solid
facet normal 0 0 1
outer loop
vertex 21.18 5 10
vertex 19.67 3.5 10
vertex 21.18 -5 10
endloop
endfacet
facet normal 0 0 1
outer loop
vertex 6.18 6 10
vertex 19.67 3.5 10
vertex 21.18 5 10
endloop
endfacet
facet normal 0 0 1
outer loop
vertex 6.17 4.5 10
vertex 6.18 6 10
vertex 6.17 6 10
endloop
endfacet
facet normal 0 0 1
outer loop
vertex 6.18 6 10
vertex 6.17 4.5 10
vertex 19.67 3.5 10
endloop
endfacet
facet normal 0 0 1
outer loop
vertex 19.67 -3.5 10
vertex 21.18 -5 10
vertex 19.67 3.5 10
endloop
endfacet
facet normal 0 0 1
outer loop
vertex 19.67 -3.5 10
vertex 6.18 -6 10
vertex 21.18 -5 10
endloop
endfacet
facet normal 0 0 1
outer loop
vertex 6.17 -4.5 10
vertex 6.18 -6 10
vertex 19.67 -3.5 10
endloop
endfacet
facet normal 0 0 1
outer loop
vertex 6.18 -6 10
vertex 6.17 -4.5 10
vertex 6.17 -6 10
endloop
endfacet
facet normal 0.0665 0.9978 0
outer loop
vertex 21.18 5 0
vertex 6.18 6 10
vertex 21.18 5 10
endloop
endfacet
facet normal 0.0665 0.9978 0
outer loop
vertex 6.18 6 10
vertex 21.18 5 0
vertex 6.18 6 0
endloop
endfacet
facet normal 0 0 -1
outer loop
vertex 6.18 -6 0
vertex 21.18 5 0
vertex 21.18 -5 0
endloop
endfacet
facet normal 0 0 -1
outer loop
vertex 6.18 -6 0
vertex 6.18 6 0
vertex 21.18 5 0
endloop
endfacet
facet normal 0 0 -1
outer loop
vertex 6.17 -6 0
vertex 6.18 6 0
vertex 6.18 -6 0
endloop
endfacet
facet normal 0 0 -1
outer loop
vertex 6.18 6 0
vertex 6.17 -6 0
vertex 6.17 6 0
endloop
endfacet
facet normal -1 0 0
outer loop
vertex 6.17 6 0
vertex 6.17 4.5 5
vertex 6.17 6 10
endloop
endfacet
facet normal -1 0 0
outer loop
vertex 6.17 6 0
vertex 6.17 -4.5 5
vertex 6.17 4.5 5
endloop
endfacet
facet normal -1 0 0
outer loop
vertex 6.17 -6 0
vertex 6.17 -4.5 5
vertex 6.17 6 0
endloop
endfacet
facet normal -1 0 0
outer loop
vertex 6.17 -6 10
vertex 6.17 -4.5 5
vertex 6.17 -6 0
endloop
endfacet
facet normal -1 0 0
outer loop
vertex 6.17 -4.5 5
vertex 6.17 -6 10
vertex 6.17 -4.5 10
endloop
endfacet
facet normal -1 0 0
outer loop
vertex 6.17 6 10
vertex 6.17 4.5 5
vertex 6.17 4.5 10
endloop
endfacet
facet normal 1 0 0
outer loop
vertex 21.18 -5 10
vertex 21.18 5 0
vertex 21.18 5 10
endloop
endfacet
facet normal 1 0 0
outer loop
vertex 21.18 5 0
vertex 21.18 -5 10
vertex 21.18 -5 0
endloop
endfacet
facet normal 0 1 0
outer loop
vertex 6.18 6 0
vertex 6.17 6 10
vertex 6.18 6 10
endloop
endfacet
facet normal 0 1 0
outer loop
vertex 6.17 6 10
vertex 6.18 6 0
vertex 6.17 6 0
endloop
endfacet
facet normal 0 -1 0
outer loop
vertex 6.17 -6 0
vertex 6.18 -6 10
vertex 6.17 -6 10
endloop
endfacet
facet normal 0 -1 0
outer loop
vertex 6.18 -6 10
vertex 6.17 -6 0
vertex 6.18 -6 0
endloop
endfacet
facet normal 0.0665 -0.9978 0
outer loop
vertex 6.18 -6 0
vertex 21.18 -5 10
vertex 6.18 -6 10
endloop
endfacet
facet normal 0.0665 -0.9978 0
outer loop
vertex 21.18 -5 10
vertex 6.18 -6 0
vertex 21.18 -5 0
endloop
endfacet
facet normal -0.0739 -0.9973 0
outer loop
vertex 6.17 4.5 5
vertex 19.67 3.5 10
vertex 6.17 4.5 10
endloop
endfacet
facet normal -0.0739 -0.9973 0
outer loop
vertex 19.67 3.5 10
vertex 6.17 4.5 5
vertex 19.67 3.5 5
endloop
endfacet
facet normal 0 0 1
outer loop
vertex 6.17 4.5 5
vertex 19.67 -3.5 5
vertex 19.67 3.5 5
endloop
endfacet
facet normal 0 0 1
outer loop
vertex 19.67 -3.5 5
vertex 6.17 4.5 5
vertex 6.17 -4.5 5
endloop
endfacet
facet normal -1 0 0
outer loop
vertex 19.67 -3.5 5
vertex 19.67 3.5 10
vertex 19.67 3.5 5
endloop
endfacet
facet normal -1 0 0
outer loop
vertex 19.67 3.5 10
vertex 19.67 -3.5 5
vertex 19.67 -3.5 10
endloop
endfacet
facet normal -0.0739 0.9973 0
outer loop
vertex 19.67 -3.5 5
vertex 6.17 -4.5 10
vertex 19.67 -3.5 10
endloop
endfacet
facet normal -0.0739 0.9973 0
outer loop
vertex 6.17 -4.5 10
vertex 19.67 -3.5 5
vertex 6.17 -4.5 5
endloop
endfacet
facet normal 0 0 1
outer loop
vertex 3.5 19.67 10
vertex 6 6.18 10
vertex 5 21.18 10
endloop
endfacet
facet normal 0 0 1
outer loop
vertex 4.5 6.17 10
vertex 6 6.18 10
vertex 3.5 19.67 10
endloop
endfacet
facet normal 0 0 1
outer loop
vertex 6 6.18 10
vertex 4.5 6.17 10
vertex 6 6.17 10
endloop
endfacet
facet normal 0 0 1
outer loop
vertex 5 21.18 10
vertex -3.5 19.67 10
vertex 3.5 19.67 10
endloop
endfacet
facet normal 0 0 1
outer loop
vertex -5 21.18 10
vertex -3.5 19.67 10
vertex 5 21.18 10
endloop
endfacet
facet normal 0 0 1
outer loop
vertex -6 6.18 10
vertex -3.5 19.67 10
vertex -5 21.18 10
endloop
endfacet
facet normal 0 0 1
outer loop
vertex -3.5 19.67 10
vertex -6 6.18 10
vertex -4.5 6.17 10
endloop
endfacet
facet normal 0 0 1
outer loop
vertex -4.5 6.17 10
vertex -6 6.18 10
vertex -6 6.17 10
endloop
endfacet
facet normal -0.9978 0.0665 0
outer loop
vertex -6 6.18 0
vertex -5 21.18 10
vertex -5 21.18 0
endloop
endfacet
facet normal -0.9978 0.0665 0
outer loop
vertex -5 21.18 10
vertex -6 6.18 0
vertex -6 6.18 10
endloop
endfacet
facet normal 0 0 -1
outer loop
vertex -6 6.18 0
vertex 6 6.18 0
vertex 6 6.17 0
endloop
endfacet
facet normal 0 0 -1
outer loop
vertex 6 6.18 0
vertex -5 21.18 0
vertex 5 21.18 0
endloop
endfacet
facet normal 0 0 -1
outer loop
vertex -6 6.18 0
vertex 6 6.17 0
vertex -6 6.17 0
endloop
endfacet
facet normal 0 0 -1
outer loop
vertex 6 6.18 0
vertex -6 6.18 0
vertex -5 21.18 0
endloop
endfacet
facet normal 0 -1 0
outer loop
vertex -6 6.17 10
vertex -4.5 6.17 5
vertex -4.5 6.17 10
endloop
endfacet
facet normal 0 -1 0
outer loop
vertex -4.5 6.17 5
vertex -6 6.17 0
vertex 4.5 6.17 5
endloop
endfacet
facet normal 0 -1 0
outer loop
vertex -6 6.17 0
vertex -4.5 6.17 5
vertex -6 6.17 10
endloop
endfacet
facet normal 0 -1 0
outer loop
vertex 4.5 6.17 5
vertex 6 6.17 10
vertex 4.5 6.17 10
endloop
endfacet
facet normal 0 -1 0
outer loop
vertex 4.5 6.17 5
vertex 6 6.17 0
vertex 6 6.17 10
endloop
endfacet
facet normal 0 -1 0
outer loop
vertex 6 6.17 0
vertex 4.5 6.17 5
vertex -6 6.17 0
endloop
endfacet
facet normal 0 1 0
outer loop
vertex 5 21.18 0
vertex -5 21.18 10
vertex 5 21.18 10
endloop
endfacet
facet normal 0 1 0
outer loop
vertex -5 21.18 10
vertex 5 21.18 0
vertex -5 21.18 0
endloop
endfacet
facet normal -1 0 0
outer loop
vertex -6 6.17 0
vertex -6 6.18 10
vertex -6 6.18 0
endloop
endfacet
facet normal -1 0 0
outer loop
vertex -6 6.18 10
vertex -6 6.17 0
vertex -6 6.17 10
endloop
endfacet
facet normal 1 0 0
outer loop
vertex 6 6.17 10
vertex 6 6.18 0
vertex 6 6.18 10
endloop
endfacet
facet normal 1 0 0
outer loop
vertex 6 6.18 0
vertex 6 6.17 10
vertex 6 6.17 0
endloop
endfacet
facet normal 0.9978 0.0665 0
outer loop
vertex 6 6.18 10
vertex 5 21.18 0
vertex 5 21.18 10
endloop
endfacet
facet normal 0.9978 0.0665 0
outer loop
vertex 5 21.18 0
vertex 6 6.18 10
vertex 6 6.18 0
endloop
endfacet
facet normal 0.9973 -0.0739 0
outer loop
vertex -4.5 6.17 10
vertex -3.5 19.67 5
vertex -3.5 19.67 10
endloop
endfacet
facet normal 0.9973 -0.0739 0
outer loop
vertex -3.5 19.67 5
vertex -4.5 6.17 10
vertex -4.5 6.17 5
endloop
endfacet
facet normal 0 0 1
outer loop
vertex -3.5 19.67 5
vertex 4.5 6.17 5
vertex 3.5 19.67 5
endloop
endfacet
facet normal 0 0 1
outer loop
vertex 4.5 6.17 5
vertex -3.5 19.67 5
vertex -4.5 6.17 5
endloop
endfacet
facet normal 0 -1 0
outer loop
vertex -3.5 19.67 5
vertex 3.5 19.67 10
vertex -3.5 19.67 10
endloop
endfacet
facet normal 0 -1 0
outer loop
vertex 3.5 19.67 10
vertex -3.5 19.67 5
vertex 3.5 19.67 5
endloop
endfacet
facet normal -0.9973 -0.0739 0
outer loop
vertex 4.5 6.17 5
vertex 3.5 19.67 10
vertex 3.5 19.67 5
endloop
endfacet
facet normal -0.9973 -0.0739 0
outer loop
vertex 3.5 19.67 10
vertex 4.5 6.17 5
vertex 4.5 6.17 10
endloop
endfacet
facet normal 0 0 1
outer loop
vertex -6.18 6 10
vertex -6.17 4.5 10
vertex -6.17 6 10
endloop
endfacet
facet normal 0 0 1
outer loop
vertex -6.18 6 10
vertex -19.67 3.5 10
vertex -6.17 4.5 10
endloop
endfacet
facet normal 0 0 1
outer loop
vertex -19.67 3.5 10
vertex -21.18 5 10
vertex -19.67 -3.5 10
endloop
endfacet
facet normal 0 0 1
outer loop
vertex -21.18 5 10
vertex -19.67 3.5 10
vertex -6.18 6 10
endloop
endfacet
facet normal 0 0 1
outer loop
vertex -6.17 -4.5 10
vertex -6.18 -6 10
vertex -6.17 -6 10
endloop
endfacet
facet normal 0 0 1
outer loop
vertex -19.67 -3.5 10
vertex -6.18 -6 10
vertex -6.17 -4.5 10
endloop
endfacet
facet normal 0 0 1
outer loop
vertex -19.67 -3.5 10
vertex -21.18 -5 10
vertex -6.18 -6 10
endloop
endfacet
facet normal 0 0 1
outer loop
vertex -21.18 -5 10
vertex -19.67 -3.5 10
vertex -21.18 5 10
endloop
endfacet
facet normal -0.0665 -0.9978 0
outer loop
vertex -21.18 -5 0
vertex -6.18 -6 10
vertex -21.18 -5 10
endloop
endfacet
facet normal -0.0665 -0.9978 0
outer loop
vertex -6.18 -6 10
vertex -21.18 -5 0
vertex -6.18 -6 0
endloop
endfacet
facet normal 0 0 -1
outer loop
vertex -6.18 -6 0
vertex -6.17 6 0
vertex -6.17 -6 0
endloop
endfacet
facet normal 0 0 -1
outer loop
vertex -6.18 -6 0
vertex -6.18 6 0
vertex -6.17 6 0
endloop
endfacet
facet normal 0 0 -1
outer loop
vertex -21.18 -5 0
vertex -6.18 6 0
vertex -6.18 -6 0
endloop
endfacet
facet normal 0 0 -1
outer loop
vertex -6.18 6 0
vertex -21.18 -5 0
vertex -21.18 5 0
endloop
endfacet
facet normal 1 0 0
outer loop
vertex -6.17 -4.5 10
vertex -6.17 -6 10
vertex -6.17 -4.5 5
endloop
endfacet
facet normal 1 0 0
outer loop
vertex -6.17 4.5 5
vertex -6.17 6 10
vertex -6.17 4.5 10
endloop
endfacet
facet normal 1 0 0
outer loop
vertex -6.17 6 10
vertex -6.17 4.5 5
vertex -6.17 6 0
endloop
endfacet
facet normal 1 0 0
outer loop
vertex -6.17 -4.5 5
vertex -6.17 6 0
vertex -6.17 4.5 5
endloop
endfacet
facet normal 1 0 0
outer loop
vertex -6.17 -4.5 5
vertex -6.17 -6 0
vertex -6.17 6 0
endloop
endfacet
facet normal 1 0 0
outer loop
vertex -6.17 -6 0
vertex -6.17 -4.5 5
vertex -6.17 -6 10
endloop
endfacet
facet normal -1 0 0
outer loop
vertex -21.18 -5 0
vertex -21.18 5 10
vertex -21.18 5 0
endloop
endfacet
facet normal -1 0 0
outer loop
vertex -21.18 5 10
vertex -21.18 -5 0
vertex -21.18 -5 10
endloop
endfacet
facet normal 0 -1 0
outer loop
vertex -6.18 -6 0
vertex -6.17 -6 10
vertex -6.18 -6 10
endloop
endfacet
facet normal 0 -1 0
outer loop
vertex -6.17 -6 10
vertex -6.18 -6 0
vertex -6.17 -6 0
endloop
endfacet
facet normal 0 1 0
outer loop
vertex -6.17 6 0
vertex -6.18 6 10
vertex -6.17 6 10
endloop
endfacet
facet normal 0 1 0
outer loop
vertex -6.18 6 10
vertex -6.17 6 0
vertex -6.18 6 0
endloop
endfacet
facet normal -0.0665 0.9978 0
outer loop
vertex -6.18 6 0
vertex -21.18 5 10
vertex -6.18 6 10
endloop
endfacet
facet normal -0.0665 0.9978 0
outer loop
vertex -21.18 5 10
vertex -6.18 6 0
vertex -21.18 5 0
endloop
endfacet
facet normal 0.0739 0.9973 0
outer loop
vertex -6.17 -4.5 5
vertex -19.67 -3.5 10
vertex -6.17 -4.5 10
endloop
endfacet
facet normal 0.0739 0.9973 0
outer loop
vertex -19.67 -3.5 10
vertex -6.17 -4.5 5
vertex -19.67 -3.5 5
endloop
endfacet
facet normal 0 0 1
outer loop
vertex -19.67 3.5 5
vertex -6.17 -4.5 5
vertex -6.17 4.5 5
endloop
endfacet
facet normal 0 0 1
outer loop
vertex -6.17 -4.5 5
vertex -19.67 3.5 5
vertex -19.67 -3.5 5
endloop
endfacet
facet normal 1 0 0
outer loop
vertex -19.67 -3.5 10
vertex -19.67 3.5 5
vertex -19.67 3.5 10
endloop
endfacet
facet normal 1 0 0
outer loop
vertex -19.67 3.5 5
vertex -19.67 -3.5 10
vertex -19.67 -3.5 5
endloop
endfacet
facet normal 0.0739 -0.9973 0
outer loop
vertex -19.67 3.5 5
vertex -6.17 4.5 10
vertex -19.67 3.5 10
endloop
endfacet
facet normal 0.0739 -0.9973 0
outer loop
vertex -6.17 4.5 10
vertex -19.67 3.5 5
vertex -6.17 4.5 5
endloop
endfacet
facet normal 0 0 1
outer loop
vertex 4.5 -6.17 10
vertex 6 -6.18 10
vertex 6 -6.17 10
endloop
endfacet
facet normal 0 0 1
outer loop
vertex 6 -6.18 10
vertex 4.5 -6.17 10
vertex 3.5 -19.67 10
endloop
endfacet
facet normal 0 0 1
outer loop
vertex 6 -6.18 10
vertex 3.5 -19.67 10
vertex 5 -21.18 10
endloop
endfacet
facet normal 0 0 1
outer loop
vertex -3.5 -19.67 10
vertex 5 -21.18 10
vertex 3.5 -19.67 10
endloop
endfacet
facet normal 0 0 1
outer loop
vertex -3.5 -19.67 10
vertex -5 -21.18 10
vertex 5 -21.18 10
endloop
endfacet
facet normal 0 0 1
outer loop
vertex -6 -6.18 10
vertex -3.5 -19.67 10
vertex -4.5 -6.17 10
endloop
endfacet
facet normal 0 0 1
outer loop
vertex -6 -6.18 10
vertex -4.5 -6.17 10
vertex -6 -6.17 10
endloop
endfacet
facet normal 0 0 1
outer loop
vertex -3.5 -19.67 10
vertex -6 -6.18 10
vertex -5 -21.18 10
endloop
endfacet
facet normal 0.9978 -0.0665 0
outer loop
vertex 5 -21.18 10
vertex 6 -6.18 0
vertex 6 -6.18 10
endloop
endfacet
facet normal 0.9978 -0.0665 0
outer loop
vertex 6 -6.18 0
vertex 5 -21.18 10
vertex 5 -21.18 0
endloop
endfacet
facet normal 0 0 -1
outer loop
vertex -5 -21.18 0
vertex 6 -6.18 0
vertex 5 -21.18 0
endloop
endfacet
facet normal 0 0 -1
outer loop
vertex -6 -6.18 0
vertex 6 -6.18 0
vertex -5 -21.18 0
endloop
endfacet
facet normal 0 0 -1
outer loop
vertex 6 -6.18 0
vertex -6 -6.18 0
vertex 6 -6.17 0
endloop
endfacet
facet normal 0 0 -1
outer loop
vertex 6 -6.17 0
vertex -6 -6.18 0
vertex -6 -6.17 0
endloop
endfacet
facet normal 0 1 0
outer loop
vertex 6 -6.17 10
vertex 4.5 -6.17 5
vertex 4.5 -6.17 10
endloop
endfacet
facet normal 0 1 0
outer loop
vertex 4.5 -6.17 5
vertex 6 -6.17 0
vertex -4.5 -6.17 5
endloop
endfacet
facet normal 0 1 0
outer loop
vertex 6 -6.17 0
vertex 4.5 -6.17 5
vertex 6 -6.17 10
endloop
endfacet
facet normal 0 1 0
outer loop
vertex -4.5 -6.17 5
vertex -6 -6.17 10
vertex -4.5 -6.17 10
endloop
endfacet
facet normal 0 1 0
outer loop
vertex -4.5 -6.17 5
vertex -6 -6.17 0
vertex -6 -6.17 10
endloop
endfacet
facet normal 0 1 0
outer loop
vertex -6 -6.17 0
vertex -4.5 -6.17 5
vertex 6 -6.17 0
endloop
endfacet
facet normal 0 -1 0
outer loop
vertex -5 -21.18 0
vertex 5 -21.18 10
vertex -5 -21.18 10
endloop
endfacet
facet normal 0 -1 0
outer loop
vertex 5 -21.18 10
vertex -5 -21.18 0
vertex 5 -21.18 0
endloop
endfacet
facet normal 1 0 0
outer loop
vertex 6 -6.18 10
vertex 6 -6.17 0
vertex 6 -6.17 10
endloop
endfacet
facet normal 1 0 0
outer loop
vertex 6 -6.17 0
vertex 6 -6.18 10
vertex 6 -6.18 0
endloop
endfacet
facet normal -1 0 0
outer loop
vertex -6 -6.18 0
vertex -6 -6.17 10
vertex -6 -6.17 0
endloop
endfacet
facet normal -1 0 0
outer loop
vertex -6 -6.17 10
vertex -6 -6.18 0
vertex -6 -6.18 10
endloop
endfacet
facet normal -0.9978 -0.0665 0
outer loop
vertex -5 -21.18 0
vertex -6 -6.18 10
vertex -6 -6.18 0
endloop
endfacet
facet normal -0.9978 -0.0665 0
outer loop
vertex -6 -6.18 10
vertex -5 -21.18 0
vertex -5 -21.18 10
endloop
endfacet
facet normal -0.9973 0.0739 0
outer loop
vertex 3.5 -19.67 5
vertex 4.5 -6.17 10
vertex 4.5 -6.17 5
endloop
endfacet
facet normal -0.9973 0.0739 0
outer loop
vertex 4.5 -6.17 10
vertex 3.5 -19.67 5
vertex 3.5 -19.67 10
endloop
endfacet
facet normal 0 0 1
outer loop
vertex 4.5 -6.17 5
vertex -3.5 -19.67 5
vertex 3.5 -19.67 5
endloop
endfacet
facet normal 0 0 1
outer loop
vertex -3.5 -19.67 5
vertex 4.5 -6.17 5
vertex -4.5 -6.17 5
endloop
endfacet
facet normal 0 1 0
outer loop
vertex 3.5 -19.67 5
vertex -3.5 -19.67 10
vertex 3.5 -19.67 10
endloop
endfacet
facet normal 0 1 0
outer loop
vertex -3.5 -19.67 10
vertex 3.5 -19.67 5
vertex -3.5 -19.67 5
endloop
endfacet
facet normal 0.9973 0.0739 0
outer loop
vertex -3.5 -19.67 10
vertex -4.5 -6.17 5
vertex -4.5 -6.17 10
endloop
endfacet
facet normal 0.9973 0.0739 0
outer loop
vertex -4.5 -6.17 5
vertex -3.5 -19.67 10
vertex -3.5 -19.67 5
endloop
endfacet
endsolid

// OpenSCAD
/* Raisers for shelf tabs */

// raising
TH   =  5;

// Tab size
H    = 10;
W1   =  9;
W2   =  7;
L    = 13.5;
WALL =  1.5;

// pin
PX   =  4;
D    = 2-1;

ATOM = 0.01;

module shape(xtra=0, h=1) {
    w1 = W1 + xtra*2;
    w2 = W2 + xtra*2;
    hull() {
        translate([0, -w1/2, 0])
        cube([ATOM, w1, h]);

        translate([L+xtra, -w2/2, 0])
        cube([ATOM, w2, h]);
    }
}

module raiser() {
    difference() {
        shape(xtra=WALL, h=H);
        translate([-ATOM, 0, TH])
        shape(xtra=0, h=H);
    }

%    translate([PX, 0, 0])
    cylinder(d=D, h=TH + .5, $fn=20);
}

for (i=[0:3])
    rotate([0, 0, 90*i])
    translate([W1/2 + WALL + .17, 0, 0])
    raiser();
